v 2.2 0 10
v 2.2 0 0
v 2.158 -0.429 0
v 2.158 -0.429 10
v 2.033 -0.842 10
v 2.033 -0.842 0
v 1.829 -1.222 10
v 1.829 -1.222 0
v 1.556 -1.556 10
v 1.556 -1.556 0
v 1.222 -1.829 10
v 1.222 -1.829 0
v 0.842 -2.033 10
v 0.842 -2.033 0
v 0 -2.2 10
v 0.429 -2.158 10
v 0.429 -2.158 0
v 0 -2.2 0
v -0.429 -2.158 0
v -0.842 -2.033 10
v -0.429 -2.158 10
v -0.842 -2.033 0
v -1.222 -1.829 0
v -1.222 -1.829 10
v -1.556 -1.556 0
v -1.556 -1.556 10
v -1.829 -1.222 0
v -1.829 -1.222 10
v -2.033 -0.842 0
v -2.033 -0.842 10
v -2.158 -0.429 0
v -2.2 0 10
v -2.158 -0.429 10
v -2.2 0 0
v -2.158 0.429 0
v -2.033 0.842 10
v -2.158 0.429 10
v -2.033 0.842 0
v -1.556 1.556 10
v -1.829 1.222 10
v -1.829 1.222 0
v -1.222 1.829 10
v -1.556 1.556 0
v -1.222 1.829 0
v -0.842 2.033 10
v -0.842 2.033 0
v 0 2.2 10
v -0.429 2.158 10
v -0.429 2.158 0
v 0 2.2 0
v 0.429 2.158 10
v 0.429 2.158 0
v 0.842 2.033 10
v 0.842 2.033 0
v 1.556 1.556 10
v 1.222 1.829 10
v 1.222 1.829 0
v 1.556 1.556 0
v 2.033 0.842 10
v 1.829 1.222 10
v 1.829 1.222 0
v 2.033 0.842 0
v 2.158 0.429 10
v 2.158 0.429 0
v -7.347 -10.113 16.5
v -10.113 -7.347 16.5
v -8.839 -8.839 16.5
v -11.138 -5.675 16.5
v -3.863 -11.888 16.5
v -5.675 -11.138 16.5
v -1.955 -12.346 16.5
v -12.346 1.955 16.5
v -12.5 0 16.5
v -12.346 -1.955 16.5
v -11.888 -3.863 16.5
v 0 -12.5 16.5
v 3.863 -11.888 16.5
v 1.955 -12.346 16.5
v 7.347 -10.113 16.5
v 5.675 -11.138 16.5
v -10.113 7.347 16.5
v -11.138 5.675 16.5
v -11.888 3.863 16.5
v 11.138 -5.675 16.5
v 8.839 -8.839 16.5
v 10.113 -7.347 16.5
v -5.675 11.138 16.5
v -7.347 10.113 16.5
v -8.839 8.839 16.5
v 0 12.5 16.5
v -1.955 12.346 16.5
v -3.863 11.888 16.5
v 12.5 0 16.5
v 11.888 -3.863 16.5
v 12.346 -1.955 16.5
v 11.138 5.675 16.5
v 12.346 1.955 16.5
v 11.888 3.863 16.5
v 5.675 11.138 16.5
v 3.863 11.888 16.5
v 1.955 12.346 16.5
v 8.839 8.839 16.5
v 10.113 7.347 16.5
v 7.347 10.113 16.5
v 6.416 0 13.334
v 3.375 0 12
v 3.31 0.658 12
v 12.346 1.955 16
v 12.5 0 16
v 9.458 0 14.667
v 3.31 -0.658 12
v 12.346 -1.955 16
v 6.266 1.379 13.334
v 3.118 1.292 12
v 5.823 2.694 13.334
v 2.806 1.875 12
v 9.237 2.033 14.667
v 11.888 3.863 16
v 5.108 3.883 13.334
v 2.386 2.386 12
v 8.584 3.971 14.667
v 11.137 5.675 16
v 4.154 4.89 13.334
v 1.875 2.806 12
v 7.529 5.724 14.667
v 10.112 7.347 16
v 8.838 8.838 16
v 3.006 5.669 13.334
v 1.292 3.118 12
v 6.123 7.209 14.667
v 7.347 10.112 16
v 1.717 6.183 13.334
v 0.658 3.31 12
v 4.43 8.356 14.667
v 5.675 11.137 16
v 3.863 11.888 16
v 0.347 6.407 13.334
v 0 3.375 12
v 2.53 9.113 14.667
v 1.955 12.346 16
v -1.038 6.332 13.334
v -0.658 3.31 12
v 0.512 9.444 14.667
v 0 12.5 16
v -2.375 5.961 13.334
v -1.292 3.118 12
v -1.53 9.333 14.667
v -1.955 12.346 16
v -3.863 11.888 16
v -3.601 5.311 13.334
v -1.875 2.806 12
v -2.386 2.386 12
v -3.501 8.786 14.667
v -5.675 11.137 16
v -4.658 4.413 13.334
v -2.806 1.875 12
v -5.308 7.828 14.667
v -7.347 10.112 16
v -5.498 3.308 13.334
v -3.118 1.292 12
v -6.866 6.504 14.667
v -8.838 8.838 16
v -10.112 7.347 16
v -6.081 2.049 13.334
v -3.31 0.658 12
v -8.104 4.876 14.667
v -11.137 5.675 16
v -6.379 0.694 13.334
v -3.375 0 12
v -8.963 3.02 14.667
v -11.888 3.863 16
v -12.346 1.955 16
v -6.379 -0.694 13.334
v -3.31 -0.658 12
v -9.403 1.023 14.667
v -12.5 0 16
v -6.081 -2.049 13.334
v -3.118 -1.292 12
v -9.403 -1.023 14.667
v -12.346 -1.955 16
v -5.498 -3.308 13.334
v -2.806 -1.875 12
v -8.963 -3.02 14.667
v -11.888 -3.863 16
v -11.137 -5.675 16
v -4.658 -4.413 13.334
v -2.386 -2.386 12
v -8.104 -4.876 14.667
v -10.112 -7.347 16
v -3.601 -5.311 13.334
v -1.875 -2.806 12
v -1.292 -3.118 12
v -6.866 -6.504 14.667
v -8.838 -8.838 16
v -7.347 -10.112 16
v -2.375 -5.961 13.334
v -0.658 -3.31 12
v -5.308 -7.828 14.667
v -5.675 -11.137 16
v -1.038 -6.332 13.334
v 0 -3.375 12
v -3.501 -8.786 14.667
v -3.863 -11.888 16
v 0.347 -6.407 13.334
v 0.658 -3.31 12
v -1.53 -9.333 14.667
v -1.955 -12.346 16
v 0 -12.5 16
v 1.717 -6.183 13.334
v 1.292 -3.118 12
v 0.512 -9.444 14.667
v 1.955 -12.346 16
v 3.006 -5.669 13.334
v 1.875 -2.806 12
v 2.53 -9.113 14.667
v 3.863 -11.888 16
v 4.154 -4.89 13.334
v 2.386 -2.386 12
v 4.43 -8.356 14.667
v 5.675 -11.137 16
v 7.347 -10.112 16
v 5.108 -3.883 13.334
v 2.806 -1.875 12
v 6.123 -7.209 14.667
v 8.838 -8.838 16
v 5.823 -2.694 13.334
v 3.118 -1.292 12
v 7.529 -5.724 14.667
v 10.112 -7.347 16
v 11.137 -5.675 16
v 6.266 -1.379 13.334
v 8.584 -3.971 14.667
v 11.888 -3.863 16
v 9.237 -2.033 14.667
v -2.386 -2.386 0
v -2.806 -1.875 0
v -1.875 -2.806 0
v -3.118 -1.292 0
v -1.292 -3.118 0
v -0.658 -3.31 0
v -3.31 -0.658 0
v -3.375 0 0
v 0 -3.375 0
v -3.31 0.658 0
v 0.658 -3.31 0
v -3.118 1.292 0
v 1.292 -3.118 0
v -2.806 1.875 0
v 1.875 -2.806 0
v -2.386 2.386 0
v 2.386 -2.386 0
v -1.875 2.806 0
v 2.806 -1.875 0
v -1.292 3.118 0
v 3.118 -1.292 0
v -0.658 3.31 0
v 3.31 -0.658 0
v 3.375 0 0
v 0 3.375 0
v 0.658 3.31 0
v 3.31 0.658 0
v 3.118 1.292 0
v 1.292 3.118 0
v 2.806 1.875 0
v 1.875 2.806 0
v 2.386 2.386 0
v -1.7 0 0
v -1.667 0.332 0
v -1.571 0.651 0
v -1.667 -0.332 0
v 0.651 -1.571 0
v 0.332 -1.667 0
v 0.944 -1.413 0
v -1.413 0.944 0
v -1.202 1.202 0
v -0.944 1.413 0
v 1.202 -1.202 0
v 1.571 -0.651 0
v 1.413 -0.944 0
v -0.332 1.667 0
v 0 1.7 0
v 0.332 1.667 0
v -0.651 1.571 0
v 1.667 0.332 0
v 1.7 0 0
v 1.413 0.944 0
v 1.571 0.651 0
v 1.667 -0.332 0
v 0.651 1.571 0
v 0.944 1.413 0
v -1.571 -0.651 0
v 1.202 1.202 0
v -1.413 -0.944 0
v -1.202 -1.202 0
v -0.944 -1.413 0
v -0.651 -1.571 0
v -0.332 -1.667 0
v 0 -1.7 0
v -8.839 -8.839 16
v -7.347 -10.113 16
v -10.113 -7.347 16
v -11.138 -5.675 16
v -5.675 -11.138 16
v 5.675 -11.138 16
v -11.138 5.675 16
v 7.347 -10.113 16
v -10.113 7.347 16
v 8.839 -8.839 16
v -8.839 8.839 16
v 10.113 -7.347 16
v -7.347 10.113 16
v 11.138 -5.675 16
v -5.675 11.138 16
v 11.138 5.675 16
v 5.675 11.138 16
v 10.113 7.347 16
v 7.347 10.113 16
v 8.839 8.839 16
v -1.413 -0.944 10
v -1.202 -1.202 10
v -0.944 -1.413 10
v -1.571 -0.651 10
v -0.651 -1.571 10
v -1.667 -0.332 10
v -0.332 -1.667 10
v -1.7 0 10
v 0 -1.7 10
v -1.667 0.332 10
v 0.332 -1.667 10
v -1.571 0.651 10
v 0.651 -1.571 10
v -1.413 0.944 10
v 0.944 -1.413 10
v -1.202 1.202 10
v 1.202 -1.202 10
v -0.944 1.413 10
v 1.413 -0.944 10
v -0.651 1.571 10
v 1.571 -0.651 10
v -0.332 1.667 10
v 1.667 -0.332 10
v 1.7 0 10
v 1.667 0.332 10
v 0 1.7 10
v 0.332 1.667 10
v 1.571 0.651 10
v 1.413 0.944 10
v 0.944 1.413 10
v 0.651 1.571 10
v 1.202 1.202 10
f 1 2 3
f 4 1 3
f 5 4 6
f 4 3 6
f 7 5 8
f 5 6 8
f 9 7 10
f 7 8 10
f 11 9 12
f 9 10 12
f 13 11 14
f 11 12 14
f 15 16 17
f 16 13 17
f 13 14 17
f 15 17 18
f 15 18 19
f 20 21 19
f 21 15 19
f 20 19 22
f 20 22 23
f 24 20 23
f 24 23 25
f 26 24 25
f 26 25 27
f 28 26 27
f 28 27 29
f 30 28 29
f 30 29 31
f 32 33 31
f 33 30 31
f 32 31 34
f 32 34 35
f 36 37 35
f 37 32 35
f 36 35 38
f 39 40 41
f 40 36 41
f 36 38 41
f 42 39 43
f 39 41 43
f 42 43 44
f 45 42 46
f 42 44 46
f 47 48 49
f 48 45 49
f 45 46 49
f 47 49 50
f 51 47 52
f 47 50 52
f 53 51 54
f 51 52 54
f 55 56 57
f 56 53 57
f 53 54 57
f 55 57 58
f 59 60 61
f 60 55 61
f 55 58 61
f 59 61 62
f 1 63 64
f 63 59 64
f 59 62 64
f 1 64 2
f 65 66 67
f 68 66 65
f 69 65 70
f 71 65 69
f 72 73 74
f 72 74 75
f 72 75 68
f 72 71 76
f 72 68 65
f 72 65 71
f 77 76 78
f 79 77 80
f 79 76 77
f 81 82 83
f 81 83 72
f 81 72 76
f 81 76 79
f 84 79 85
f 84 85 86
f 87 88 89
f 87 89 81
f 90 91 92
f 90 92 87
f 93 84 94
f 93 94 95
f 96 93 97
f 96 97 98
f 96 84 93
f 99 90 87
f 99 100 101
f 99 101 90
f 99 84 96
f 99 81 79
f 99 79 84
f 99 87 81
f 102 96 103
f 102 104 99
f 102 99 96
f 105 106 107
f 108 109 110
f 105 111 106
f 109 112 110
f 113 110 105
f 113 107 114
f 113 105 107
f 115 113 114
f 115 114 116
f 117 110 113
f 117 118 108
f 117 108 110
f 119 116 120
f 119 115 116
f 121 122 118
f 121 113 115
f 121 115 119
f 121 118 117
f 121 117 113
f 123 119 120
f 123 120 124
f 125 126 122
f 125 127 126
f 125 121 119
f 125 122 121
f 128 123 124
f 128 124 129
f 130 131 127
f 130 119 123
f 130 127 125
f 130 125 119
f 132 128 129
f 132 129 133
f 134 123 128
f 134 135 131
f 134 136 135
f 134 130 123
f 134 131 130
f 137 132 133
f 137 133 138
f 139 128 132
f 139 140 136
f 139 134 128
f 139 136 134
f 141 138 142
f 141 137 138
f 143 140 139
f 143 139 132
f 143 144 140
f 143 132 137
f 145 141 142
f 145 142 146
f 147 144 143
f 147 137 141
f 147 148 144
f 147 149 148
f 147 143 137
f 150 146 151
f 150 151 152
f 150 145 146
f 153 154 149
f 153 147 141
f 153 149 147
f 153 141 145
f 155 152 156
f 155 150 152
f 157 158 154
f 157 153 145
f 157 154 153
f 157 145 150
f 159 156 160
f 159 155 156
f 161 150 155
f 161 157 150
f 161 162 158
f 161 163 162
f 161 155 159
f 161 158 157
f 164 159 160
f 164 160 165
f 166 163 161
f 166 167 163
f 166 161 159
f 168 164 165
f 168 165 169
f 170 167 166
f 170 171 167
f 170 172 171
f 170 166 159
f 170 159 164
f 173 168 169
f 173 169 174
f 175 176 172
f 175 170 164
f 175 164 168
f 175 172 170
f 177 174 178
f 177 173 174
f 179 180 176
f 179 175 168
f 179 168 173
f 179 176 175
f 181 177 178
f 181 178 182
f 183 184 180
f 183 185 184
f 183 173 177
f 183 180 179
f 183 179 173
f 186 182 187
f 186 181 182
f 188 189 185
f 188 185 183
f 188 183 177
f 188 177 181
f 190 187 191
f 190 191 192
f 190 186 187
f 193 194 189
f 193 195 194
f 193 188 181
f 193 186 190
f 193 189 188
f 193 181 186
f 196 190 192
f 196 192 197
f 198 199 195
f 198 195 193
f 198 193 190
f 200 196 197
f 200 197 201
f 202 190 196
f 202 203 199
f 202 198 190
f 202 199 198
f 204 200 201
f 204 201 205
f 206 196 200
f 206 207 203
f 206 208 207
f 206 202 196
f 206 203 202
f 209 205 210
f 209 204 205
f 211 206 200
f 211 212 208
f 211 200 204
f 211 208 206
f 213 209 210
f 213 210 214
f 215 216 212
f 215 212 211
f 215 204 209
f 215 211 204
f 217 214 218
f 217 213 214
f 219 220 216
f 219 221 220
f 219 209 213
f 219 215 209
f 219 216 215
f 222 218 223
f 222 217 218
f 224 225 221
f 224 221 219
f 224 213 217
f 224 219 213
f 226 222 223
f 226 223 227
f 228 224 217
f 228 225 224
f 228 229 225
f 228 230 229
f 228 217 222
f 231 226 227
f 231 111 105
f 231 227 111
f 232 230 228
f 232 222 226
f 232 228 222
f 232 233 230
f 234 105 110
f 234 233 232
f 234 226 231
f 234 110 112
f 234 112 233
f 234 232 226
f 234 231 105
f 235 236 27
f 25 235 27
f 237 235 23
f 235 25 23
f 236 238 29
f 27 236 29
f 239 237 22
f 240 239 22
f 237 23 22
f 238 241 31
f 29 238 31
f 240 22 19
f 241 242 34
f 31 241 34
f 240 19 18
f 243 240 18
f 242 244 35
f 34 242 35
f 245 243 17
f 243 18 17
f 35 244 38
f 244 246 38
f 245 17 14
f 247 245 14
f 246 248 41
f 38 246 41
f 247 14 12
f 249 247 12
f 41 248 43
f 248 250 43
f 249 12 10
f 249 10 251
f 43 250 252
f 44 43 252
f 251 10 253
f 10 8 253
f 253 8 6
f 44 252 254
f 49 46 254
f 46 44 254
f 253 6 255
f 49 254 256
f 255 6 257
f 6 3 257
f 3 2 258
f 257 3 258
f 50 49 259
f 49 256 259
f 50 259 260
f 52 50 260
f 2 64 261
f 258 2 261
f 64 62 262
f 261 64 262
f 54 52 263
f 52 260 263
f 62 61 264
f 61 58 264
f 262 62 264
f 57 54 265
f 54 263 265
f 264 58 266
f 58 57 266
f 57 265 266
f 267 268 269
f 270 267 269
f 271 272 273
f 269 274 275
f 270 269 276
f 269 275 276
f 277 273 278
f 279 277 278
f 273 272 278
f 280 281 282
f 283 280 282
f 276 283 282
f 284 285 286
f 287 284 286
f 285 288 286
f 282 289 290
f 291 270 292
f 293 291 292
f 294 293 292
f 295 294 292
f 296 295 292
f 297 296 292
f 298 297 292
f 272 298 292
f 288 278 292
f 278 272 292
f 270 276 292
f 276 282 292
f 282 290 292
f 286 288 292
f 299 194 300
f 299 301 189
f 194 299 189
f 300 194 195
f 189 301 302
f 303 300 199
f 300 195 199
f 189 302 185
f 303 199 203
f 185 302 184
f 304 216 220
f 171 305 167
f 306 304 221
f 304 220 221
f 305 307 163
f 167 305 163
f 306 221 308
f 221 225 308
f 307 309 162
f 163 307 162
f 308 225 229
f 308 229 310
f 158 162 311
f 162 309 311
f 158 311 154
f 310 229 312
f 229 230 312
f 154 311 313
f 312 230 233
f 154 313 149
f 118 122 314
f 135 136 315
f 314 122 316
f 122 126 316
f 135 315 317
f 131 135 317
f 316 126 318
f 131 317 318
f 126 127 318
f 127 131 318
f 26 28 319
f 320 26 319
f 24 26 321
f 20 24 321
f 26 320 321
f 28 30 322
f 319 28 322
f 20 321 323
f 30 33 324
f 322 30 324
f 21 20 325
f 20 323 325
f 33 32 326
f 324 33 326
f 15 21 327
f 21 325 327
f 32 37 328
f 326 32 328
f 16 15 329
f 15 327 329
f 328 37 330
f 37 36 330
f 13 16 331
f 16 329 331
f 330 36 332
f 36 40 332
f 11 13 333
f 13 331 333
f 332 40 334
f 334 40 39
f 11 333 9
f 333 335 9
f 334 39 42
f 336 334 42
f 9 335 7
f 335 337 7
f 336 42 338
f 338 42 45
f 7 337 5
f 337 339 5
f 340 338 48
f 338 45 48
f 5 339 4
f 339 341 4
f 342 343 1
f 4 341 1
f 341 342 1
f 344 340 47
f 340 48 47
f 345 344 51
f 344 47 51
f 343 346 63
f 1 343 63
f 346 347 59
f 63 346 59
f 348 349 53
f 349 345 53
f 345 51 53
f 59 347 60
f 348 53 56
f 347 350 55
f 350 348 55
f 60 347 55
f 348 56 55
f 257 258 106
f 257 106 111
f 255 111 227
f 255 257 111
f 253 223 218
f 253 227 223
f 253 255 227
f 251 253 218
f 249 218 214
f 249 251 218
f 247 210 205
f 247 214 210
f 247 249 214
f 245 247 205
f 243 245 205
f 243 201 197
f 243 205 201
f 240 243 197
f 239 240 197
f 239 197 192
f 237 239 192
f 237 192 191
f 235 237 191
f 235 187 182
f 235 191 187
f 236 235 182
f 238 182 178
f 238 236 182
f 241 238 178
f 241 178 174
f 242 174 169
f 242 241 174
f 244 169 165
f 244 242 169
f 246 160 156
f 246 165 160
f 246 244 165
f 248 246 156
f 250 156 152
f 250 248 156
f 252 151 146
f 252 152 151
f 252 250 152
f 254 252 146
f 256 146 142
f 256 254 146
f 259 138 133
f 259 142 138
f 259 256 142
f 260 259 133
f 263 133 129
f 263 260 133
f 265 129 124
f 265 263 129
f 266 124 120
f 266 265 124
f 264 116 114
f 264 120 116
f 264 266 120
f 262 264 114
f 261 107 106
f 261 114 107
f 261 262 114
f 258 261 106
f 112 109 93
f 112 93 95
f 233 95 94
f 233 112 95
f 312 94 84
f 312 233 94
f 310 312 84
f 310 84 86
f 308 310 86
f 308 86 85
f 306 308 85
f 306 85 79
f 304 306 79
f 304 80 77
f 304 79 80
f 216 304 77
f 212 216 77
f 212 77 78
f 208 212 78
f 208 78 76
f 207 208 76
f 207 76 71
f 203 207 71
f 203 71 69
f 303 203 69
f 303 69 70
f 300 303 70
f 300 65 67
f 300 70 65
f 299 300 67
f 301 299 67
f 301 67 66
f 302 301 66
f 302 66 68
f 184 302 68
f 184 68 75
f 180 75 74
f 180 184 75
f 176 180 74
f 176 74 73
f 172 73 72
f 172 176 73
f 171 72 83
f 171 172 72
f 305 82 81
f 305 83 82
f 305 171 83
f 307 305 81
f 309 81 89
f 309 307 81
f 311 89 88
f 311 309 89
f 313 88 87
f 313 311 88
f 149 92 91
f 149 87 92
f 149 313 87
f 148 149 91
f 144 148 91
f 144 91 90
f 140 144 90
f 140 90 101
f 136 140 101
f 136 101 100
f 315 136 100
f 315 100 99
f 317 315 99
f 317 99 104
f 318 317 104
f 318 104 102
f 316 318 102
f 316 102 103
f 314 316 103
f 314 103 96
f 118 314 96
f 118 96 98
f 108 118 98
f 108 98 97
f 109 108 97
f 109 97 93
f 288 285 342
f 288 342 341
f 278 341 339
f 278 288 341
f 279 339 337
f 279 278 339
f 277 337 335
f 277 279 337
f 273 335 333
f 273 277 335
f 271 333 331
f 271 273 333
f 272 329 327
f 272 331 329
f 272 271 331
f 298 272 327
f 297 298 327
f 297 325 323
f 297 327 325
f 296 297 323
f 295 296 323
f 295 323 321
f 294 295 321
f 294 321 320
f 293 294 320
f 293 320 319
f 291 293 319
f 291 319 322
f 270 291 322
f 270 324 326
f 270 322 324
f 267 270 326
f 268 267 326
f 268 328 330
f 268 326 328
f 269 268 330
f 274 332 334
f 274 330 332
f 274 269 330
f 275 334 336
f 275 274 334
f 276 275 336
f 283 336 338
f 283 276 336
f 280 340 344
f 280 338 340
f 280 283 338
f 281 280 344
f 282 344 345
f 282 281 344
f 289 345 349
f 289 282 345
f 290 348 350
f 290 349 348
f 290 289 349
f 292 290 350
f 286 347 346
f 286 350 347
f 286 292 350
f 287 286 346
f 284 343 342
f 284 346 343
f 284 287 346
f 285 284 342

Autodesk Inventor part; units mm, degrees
ref_plane "YZ Plane" through (0, 0, 0) normal (1, 0, 0) x (0, 1, 0)
ref_plane "XZ Plane" through (0, 0, 0) normal (0, 1, 0) x (-1, 0, 0)
ref_plane "XY Plane" through (0, 0, 0) normal (0, 0, 1) x (1, 0, 0)
sketch "Sketch1" plane through (0, 0, 0) normal (0, 0, 1) x (1, 0, 0)
  circle A0 centre (0, 0) radius 1.7
  circle A1 centre (0, 0) radius 2.2
  circle A2 centre (0, 0) radius 3.375
  dimension "d0" = 3.4
  dimension "d1" = 0.5
  dimension "d3" = 6.75
extrude "Extrusion1" add sketch "Sketch1" along normal blind 10
sketch "Sketch2" plane through (0, 0, 10) normal (0, 0, 1) x (1, 0, 0)
  circle A0 centre (0, 0) radius 3.375
  dimension "d6" = 6.75
extrude "Extrusion2" add sketch "Sketch2" along normal blind 6
sketch "Sketch3" plane through (0, 0, 16) normal (0, 0, 1) x (1, 0, 0)
  circle A0 centre (0, 0) radius 12.5
  dimension "d12" = 25
extrude "Extrusion3" add sketch "Sketch3" along normal blind 0.5
chamfer "Chamfer2" distance 9.125 distance2 4 1 edges at (-3.375, 0, 16) measured on face at (9.3373, -0.9971, 16)
properties part number "SpringCapV1"
